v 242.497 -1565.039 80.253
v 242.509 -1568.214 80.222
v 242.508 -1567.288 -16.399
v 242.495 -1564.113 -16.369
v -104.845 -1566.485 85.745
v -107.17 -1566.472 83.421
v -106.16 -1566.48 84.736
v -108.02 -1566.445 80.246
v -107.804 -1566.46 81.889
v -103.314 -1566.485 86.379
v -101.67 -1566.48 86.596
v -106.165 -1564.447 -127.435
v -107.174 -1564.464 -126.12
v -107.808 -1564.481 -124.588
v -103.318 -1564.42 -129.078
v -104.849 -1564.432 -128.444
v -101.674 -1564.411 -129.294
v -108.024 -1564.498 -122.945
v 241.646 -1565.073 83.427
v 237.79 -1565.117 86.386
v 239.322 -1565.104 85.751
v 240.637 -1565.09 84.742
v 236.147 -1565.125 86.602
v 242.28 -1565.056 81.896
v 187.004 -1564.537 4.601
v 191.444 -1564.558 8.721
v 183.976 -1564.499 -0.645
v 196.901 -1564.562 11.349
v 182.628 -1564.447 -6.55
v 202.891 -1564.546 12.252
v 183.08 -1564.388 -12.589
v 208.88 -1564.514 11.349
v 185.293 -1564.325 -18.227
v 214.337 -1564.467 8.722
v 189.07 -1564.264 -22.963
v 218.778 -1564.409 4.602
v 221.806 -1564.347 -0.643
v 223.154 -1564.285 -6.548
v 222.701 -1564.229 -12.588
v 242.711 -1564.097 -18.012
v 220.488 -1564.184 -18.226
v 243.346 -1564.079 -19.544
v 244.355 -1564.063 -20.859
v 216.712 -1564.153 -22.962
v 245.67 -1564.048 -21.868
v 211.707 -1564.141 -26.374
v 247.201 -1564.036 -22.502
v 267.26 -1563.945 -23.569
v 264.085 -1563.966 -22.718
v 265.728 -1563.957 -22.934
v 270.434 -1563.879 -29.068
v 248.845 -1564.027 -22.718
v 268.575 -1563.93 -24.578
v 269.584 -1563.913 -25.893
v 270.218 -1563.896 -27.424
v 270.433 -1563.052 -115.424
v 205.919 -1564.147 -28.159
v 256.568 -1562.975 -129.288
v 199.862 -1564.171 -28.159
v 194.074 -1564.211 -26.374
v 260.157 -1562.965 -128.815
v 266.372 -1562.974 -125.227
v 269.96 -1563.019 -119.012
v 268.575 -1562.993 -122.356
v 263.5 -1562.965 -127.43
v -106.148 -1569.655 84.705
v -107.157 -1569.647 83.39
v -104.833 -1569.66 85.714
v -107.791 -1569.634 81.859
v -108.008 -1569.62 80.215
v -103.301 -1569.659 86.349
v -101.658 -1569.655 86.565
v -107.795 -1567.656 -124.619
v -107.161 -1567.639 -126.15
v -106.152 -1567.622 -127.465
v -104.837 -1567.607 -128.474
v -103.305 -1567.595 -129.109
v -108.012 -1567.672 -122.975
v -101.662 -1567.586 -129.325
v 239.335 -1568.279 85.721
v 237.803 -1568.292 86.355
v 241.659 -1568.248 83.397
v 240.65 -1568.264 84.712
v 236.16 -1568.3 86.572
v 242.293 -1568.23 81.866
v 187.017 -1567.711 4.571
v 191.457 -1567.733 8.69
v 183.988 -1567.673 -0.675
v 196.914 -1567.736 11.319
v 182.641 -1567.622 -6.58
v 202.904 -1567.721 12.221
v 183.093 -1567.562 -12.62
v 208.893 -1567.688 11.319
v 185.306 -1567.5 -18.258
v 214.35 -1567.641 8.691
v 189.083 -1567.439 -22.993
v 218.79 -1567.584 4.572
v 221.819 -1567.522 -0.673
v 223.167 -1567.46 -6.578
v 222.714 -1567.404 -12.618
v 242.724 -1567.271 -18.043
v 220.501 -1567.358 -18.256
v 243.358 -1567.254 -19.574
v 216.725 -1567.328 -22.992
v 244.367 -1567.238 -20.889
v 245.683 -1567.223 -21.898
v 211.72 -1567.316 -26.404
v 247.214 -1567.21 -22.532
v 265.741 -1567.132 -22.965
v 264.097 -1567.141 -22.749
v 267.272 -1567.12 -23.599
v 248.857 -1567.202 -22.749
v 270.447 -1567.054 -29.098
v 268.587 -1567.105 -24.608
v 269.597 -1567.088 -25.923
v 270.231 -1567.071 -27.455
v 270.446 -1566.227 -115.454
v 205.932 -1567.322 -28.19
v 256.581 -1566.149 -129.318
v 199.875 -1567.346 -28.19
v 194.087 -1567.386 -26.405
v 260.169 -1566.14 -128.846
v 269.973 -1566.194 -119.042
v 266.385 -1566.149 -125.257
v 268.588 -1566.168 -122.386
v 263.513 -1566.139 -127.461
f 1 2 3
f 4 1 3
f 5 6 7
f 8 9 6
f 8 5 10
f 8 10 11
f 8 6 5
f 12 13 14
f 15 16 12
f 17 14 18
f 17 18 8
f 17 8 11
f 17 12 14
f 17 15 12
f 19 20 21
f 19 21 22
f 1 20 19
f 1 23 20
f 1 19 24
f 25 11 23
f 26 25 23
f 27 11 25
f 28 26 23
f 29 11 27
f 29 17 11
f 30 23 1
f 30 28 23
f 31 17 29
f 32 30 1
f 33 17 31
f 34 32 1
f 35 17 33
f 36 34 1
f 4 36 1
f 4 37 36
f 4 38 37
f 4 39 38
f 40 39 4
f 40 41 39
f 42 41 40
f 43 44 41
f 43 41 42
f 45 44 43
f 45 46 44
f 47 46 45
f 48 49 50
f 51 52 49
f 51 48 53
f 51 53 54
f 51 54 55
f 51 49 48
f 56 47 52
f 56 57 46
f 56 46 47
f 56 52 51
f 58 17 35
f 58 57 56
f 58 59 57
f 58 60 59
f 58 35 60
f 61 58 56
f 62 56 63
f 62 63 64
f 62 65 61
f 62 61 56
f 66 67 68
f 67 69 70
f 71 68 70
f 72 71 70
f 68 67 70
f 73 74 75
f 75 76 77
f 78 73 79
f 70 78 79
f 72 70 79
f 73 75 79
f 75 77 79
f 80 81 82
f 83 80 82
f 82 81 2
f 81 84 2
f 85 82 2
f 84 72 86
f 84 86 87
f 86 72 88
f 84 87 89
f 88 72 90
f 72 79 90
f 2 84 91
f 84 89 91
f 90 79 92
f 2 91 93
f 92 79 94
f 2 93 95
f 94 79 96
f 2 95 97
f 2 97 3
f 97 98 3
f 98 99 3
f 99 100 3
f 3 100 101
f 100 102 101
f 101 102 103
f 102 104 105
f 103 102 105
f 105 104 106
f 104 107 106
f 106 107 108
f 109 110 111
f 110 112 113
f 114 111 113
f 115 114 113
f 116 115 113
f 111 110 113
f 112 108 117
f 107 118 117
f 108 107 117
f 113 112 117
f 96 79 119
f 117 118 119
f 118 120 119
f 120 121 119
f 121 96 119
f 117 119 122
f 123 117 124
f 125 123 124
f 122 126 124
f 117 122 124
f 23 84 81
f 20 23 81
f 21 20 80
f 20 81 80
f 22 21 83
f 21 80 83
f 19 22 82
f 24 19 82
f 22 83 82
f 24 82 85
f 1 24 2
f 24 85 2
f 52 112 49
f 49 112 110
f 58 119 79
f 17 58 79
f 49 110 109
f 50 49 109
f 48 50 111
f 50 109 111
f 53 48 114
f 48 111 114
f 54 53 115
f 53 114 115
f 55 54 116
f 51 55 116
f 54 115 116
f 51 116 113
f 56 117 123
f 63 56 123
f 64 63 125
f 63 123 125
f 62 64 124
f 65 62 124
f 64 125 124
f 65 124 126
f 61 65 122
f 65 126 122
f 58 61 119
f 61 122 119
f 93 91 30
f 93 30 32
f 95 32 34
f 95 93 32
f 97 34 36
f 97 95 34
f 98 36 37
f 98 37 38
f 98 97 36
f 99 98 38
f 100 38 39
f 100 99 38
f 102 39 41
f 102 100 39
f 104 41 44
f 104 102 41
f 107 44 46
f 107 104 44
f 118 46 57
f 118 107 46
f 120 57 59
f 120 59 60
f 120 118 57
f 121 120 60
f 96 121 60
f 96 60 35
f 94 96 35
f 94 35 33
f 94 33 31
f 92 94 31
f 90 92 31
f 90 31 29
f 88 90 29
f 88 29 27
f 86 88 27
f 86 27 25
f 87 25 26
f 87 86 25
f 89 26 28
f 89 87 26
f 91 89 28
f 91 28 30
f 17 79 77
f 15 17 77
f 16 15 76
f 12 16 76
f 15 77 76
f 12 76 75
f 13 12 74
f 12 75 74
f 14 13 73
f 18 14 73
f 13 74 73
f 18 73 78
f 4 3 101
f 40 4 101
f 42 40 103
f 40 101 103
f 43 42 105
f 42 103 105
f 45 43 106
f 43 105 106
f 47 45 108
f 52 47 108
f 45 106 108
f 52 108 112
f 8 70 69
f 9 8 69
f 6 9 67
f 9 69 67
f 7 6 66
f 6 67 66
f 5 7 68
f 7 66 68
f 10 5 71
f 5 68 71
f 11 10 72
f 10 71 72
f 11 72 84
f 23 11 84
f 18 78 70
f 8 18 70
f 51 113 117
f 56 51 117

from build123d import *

# Parameters (mm, degrees)
BOSS_EXTRUDE1_DEPTH = 3.175
SKETCH4_R           = 20.32
CUT_EXTRUDE1_DEPTH  = 3.175


with BuildPart() as part:
    # Sketch1 → Boss-Extrude1 (new body)
    with BuildSketch(Plane(origin=(3.144869288, -1568.333107971, -7.514232815), x_dir=(0.9999919583187062, 0.004010352693004623, 1.921449190373677e-05), z_dir=(-0.004010352693004623, 0.9999460479318565, 0.009582186427904116))):
        with BuildLine():
            Line((253.440636473, 121.814232815), (-104.805130712, 121.814232815))
            ThreePointArc((-104.805130712, 121.814232815), (-109.295258773, 119.954360876), (-111.155130712, 115.464232815))
            Line((-111.155130712, 115.464232815), (-111.155130712, -87.735767185))
            ThreePointArc((-111.155130712, -87.735767185), (-109.295258773, -92.225895245), (-104.805130712, -94.085767185))
            Line((-104.805130712, -94.085767185), (233.014869288, -94.085767185))
            ThreePointArc((233.014869288, -94.085767185), (237.504997348, -92.225895245), (239.364869288, -87.735767185))
            Line((239.364869288, -87.735767185), (239.364869288, 8.89))
            ThreePointArc((239.364869288, 8.89), (241.224741227, 13.380128061), (245.714869288, 15.24))
            Line((245.714869288, 15.24), (260.954869288, 15.24))
            ThreePointArc((260.954869288, 15.24), (265.444997348, 17.099871939), (267.304869288, 21.59))
            Line((267.304869288, 21.59), (267.304869288, 107.95))
            ThreePointArc((267.304869288, 107.95), (263.244129512, 117.753493039), (253.440636473, 121.814232815))
        make_face()
    extrude(amount=BOSS_EXTRUDE1_DEPTH)

    # Sketch4 → Cut-Extrude1 (cut)
    with BuildSketch(Plane(origin=(3.157601814, -1568.332765376, -7.544655436), x_dir=(0.9999919583187062, 0.004010352693004624, 1.9214491903792285e-05), z_dir=(-0.004010352693004624, 0.9999460479318565, 0.009582186427904121))):
        with Locations(Location((199.747601441, 0.556803893, 0), (0, 0, 269.998899082))):
            Circle(SKETCH4_R)
    extrude(amount=CUT_EXTRUDE1_DEPTH, mode=Mode.SUBTRACT)


solid = part.part
